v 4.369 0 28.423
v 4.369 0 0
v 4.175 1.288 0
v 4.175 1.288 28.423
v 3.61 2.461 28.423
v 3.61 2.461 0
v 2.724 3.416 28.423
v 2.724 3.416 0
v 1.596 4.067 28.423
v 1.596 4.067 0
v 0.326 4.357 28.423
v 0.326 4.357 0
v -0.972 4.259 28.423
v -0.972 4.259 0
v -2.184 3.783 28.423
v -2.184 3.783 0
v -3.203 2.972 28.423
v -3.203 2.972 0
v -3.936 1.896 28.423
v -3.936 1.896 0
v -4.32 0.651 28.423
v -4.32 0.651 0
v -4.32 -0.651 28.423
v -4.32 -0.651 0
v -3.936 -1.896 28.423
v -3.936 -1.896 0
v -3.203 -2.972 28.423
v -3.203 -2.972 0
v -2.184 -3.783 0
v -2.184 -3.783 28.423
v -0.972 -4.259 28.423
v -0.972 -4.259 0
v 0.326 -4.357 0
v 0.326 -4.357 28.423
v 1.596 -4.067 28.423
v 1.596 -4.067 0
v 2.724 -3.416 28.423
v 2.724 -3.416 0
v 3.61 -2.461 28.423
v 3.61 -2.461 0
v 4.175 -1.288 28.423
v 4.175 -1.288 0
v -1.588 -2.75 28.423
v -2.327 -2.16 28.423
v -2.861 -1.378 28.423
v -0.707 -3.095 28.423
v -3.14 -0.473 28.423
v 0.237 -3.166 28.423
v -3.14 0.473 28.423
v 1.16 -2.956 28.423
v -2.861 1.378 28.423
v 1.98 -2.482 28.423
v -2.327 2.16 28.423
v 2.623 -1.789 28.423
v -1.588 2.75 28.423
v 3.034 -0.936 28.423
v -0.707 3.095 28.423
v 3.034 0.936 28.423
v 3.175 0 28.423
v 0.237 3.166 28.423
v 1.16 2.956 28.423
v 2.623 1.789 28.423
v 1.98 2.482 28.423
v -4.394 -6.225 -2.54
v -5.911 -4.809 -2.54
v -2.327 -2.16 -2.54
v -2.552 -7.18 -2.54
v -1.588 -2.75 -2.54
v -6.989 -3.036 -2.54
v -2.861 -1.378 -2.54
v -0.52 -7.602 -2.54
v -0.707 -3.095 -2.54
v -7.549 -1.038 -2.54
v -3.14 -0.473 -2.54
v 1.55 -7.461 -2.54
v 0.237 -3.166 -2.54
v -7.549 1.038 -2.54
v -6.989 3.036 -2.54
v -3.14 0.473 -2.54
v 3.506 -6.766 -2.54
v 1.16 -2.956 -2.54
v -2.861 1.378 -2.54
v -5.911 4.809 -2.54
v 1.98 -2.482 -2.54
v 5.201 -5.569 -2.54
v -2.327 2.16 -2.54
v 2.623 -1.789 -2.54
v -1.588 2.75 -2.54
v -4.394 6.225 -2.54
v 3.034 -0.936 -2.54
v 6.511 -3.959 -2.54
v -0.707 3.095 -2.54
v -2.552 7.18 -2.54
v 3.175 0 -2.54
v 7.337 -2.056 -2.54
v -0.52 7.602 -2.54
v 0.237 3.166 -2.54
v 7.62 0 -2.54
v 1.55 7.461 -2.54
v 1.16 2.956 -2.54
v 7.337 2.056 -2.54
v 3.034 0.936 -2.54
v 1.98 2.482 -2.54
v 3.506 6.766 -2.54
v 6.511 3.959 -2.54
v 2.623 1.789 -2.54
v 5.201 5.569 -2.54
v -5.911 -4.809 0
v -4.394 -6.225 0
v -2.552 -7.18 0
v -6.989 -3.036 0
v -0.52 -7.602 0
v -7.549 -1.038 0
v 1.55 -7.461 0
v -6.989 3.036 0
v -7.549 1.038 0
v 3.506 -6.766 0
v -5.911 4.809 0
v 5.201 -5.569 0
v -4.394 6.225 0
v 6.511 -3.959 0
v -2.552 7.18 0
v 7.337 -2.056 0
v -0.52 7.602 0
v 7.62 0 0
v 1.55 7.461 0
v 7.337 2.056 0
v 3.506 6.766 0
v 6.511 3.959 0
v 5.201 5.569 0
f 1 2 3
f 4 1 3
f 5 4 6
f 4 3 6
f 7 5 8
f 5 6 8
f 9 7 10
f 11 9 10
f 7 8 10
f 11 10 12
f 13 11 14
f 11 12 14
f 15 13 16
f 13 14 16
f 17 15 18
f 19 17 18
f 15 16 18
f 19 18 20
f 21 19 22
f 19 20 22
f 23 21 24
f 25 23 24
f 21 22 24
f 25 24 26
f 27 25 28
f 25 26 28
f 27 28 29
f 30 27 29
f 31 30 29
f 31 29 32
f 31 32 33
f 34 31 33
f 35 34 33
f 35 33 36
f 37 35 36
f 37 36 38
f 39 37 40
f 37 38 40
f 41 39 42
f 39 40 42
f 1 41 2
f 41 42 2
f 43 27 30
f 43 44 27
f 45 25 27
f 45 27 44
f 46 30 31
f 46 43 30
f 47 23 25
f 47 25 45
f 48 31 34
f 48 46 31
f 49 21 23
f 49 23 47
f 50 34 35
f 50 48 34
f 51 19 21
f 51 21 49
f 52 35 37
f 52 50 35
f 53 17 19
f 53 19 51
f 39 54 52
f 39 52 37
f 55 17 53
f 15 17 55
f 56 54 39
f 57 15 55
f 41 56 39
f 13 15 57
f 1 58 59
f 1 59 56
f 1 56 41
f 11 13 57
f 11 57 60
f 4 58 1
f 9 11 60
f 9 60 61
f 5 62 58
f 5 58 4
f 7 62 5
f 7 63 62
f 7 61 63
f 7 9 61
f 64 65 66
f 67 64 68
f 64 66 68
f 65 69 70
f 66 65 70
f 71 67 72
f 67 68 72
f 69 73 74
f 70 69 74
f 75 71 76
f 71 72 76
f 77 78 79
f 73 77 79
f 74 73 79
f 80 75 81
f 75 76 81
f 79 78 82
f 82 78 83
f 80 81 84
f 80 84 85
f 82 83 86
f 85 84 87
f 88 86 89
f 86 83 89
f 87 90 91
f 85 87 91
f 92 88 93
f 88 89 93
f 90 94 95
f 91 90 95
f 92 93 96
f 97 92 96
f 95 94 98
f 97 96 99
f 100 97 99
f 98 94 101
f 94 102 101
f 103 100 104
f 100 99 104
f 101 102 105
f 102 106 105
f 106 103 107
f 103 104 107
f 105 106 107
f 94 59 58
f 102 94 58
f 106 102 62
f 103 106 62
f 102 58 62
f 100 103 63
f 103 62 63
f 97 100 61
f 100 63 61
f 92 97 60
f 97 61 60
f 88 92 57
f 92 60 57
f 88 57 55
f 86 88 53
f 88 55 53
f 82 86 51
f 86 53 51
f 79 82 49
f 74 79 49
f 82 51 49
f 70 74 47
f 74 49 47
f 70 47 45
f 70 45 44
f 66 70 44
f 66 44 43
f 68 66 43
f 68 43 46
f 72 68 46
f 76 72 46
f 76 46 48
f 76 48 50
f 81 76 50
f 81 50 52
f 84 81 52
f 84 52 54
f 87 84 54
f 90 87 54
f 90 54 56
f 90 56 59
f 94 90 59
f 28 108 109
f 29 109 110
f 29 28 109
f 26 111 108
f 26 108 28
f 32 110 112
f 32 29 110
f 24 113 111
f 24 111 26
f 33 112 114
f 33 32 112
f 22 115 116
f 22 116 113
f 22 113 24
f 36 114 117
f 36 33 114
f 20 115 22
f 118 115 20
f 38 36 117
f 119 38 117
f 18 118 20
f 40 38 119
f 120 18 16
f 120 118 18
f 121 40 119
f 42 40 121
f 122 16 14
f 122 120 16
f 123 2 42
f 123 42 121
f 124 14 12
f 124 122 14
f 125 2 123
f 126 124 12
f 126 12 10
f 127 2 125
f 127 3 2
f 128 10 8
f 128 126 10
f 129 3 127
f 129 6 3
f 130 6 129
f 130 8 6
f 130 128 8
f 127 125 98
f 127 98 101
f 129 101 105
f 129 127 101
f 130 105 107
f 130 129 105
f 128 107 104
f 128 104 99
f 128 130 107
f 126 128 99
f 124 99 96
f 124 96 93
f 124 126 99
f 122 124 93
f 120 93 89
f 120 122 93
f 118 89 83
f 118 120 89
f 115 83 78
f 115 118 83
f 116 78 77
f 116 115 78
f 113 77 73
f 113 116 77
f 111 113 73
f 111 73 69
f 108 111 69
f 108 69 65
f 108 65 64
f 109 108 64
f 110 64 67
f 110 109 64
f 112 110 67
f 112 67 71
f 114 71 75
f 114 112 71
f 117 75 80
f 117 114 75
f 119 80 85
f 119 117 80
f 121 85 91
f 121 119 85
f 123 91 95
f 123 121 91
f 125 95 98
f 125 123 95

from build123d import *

# Parameters (mm, degrees)
F0_R     = 4.3688
F1_DEPTH = 28.4226
F0_R_2   = 7.62
F2_DEPTH = 2.54
F3_R     = 3.175
F4_DEPTH = 30.9636


# Not quite as in the source:
# - a feature names something its author has since deleted; it is built from what else it names


with BuildPart() as f1:
    # F0 (on Top) → F1 (new body)
    with BuildSketch(Plane.XY):
        Circle(F0_R)
    extrude(amount=F1_DEPTH)

    # F0 (on Top) → F2 (join)
    with BuildSketch(Plane.XY):
        Circle(F0_R_2)
        Circle(F0_R, mode=Mode.SUBTRACT)
        Circle(F0_R)
    extrude(amount=-F2_DEPTH)

    # F3 (on face) → F4 (cut, through all)
    with BuildSketch(Plane.XY.offset(28.4226)):
        Circle(F3_R)
    extrude(amount=-F4_DEPTH, mode=Mode.SUBTRACT)


solid = f1.part
